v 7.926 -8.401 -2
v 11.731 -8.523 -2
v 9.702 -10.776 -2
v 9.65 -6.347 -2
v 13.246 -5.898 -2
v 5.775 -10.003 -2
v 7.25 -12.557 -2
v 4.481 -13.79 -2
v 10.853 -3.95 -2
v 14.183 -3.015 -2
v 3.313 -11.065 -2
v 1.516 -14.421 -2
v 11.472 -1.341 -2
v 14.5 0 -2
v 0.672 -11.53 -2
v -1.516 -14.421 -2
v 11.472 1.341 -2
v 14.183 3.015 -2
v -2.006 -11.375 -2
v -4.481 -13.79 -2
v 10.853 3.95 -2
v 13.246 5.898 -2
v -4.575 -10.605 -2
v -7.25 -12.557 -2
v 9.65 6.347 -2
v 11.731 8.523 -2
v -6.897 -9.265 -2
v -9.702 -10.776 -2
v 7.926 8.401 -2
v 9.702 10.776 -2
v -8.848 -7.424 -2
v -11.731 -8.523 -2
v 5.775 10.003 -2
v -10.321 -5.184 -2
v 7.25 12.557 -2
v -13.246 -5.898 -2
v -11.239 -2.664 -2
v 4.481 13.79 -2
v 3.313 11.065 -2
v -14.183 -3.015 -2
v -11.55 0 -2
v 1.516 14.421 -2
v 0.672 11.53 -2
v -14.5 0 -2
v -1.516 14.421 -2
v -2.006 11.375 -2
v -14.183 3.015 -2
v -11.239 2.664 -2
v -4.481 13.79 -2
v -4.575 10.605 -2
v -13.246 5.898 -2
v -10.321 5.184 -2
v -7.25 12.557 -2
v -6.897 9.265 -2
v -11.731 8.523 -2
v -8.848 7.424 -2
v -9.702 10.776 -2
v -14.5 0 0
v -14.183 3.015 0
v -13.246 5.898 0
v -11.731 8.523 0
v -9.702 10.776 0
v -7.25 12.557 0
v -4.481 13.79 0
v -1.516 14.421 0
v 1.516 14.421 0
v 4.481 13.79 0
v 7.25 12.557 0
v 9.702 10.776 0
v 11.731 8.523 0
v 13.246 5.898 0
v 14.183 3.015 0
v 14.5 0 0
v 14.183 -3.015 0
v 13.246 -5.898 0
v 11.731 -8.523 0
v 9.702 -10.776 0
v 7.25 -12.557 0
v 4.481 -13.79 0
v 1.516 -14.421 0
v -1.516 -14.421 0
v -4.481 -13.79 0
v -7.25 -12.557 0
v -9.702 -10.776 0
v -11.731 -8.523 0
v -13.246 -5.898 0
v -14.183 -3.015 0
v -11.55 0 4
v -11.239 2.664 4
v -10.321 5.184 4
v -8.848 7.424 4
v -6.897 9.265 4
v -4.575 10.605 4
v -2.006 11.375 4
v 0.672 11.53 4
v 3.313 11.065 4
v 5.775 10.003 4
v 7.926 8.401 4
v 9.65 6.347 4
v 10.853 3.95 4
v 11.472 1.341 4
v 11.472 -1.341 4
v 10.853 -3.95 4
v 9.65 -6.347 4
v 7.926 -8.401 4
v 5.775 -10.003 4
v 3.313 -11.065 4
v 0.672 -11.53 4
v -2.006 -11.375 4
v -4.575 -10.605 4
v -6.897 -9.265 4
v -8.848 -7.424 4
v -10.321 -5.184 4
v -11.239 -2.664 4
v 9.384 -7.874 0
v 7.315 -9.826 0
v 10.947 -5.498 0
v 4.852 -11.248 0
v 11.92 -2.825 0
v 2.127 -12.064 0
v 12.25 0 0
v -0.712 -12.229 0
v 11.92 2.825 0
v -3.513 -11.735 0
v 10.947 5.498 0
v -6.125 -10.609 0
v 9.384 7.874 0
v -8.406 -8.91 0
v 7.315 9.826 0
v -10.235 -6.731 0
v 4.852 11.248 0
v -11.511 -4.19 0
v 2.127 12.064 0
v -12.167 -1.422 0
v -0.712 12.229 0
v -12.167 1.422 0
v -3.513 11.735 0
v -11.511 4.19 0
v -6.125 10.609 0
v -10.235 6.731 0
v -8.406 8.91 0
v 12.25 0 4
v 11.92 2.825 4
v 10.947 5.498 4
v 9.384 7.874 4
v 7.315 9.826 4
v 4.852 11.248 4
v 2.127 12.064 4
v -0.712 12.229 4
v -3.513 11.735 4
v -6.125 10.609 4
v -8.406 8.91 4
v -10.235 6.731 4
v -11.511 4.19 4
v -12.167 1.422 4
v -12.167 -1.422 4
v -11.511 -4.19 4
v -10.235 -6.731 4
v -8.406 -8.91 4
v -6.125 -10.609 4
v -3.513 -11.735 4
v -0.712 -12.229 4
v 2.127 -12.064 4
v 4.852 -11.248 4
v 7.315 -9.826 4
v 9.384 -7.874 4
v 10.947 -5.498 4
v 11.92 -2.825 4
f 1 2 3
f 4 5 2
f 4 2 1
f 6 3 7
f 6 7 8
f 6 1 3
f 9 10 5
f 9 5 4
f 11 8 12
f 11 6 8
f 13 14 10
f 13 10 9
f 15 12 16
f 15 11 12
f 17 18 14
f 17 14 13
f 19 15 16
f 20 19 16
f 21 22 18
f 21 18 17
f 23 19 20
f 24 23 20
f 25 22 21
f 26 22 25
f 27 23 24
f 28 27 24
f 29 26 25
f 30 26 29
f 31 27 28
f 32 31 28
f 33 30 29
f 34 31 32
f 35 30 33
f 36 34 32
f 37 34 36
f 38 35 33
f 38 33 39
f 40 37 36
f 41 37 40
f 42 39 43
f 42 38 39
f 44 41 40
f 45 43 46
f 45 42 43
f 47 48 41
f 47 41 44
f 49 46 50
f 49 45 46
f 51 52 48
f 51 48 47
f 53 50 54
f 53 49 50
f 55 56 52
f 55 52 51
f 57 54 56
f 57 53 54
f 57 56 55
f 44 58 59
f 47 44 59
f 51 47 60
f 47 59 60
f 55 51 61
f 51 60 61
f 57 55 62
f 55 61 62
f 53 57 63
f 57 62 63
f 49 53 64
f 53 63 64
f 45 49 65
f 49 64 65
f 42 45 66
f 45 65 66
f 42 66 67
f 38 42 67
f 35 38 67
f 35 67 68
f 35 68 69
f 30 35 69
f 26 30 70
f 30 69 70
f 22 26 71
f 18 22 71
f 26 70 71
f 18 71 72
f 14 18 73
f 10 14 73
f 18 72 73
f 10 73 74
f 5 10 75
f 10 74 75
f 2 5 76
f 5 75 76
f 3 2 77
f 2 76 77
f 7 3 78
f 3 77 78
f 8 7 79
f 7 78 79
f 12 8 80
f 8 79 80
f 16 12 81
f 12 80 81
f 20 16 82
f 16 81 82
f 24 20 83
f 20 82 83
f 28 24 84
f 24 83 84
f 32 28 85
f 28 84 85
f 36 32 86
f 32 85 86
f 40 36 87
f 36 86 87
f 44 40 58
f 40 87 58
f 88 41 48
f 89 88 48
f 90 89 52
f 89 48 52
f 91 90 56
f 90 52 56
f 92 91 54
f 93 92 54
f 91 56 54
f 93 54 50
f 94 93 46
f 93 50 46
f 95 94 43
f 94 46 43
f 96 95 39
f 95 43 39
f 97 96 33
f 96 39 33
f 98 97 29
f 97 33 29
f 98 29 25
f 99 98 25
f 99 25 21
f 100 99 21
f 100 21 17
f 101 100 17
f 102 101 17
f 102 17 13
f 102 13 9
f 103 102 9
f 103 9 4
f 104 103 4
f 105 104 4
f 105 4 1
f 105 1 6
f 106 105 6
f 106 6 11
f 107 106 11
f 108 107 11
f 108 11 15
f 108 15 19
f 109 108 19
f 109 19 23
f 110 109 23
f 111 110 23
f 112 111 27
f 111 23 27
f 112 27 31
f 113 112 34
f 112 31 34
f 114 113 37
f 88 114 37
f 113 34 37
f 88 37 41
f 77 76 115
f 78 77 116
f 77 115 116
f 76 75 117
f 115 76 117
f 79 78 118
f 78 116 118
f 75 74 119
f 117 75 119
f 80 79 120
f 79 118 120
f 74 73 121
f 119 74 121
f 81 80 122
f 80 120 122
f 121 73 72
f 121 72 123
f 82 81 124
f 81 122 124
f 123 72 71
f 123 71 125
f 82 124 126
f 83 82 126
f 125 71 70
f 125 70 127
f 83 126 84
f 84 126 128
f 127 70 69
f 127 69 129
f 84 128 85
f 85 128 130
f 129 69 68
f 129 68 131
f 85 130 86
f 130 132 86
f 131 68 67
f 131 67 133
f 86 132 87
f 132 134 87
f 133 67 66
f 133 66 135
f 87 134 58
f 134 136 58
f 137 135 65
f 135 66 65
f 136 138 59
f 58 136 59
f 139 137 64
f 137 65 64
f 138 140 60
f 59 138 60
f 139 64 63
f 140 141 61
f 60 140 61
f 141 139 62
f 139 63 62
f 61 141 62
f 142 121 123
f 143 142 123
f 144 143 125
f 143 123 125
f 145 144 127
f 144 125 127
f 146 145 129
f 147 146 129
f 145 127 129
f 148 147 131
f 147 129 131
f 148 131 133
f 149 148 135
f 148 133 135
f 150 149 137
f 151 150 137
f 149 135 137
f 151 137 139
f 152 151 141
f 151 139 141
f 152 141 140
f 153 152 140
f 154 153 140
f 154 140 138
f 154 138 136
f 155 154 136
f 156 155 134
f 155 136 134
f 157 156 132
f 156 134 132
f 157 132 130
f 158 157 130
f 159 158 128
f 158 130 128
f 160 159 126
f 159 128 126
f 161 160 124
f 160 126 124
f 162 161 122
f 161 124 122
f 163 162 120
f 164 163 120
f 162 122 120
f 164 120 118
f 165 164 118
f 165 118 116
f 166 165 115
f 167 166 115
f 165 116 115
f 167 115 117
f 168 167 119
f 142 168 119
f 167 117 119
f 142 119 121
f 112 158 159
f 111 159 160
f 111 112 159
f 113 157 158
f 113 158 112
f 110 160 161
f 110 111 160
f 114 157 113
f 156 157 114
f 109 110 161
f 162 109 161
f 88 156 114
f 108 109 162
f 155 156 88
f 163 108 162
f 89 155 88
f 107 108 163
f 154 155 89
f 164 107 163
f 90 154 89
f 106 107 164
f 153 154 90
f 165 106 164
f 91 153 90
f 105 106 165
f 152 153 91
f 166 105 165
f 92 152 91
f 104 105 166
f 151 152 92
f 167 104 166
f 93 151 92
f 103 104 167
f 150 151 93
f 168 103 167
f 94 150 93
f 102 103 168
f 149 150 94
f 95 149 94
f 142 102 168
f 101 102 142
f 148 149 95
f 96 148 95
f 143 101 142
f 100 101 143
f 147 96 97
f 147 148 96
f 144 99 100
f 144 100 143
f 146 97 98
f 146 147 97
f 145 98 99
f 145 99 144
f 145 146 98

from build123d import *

# Parameters (mm, degrees)
CROQUIS1_R              = 12.25
SALIENTE_EXTRUIR1_DEPTH = 4
CROQUIS2_R              = 14.5
SALIENTE_EXTRUIR2_DEPTH = 2
CROQUIS3_R              = 11.55
CORTAR_EXTRUIR1_DEPTH   = 10


with BuildPart() as part:
    # Croquis1 → Saliente-Extruir1 (new body)
    with BuildSketch(Plane.XY):
        Circle(CROQUIS1_R)
    extrude(amount=SALIENTE_EXTRUIR1_DEPTH)

    # Croquis2 → Saliente-Extruir2 (add)
    with BuildSketch(Plane(origin=(0, 0, 0), x_dir=(-1, 0, 0), z_dir=(0, 0, -1))):
        Circle(CROQUIS2_R)
    extrude(amount=SALIENTE_EXTRUIR2_DEPTH)

    # Croquis3 → Cortar-Extruir1 (cut)
    with BuildSketch(Plane(origin=(0, 0, -2), x_dir=(-1, 0, 0), z_dir=(0, 0, -1))):
        Circle(CROQUIS3_R)
    extrude(amount=-CORTAR_EXTRUIR1_DEPTH, mode=Mode.SUBTRACT)


solid = part.part
